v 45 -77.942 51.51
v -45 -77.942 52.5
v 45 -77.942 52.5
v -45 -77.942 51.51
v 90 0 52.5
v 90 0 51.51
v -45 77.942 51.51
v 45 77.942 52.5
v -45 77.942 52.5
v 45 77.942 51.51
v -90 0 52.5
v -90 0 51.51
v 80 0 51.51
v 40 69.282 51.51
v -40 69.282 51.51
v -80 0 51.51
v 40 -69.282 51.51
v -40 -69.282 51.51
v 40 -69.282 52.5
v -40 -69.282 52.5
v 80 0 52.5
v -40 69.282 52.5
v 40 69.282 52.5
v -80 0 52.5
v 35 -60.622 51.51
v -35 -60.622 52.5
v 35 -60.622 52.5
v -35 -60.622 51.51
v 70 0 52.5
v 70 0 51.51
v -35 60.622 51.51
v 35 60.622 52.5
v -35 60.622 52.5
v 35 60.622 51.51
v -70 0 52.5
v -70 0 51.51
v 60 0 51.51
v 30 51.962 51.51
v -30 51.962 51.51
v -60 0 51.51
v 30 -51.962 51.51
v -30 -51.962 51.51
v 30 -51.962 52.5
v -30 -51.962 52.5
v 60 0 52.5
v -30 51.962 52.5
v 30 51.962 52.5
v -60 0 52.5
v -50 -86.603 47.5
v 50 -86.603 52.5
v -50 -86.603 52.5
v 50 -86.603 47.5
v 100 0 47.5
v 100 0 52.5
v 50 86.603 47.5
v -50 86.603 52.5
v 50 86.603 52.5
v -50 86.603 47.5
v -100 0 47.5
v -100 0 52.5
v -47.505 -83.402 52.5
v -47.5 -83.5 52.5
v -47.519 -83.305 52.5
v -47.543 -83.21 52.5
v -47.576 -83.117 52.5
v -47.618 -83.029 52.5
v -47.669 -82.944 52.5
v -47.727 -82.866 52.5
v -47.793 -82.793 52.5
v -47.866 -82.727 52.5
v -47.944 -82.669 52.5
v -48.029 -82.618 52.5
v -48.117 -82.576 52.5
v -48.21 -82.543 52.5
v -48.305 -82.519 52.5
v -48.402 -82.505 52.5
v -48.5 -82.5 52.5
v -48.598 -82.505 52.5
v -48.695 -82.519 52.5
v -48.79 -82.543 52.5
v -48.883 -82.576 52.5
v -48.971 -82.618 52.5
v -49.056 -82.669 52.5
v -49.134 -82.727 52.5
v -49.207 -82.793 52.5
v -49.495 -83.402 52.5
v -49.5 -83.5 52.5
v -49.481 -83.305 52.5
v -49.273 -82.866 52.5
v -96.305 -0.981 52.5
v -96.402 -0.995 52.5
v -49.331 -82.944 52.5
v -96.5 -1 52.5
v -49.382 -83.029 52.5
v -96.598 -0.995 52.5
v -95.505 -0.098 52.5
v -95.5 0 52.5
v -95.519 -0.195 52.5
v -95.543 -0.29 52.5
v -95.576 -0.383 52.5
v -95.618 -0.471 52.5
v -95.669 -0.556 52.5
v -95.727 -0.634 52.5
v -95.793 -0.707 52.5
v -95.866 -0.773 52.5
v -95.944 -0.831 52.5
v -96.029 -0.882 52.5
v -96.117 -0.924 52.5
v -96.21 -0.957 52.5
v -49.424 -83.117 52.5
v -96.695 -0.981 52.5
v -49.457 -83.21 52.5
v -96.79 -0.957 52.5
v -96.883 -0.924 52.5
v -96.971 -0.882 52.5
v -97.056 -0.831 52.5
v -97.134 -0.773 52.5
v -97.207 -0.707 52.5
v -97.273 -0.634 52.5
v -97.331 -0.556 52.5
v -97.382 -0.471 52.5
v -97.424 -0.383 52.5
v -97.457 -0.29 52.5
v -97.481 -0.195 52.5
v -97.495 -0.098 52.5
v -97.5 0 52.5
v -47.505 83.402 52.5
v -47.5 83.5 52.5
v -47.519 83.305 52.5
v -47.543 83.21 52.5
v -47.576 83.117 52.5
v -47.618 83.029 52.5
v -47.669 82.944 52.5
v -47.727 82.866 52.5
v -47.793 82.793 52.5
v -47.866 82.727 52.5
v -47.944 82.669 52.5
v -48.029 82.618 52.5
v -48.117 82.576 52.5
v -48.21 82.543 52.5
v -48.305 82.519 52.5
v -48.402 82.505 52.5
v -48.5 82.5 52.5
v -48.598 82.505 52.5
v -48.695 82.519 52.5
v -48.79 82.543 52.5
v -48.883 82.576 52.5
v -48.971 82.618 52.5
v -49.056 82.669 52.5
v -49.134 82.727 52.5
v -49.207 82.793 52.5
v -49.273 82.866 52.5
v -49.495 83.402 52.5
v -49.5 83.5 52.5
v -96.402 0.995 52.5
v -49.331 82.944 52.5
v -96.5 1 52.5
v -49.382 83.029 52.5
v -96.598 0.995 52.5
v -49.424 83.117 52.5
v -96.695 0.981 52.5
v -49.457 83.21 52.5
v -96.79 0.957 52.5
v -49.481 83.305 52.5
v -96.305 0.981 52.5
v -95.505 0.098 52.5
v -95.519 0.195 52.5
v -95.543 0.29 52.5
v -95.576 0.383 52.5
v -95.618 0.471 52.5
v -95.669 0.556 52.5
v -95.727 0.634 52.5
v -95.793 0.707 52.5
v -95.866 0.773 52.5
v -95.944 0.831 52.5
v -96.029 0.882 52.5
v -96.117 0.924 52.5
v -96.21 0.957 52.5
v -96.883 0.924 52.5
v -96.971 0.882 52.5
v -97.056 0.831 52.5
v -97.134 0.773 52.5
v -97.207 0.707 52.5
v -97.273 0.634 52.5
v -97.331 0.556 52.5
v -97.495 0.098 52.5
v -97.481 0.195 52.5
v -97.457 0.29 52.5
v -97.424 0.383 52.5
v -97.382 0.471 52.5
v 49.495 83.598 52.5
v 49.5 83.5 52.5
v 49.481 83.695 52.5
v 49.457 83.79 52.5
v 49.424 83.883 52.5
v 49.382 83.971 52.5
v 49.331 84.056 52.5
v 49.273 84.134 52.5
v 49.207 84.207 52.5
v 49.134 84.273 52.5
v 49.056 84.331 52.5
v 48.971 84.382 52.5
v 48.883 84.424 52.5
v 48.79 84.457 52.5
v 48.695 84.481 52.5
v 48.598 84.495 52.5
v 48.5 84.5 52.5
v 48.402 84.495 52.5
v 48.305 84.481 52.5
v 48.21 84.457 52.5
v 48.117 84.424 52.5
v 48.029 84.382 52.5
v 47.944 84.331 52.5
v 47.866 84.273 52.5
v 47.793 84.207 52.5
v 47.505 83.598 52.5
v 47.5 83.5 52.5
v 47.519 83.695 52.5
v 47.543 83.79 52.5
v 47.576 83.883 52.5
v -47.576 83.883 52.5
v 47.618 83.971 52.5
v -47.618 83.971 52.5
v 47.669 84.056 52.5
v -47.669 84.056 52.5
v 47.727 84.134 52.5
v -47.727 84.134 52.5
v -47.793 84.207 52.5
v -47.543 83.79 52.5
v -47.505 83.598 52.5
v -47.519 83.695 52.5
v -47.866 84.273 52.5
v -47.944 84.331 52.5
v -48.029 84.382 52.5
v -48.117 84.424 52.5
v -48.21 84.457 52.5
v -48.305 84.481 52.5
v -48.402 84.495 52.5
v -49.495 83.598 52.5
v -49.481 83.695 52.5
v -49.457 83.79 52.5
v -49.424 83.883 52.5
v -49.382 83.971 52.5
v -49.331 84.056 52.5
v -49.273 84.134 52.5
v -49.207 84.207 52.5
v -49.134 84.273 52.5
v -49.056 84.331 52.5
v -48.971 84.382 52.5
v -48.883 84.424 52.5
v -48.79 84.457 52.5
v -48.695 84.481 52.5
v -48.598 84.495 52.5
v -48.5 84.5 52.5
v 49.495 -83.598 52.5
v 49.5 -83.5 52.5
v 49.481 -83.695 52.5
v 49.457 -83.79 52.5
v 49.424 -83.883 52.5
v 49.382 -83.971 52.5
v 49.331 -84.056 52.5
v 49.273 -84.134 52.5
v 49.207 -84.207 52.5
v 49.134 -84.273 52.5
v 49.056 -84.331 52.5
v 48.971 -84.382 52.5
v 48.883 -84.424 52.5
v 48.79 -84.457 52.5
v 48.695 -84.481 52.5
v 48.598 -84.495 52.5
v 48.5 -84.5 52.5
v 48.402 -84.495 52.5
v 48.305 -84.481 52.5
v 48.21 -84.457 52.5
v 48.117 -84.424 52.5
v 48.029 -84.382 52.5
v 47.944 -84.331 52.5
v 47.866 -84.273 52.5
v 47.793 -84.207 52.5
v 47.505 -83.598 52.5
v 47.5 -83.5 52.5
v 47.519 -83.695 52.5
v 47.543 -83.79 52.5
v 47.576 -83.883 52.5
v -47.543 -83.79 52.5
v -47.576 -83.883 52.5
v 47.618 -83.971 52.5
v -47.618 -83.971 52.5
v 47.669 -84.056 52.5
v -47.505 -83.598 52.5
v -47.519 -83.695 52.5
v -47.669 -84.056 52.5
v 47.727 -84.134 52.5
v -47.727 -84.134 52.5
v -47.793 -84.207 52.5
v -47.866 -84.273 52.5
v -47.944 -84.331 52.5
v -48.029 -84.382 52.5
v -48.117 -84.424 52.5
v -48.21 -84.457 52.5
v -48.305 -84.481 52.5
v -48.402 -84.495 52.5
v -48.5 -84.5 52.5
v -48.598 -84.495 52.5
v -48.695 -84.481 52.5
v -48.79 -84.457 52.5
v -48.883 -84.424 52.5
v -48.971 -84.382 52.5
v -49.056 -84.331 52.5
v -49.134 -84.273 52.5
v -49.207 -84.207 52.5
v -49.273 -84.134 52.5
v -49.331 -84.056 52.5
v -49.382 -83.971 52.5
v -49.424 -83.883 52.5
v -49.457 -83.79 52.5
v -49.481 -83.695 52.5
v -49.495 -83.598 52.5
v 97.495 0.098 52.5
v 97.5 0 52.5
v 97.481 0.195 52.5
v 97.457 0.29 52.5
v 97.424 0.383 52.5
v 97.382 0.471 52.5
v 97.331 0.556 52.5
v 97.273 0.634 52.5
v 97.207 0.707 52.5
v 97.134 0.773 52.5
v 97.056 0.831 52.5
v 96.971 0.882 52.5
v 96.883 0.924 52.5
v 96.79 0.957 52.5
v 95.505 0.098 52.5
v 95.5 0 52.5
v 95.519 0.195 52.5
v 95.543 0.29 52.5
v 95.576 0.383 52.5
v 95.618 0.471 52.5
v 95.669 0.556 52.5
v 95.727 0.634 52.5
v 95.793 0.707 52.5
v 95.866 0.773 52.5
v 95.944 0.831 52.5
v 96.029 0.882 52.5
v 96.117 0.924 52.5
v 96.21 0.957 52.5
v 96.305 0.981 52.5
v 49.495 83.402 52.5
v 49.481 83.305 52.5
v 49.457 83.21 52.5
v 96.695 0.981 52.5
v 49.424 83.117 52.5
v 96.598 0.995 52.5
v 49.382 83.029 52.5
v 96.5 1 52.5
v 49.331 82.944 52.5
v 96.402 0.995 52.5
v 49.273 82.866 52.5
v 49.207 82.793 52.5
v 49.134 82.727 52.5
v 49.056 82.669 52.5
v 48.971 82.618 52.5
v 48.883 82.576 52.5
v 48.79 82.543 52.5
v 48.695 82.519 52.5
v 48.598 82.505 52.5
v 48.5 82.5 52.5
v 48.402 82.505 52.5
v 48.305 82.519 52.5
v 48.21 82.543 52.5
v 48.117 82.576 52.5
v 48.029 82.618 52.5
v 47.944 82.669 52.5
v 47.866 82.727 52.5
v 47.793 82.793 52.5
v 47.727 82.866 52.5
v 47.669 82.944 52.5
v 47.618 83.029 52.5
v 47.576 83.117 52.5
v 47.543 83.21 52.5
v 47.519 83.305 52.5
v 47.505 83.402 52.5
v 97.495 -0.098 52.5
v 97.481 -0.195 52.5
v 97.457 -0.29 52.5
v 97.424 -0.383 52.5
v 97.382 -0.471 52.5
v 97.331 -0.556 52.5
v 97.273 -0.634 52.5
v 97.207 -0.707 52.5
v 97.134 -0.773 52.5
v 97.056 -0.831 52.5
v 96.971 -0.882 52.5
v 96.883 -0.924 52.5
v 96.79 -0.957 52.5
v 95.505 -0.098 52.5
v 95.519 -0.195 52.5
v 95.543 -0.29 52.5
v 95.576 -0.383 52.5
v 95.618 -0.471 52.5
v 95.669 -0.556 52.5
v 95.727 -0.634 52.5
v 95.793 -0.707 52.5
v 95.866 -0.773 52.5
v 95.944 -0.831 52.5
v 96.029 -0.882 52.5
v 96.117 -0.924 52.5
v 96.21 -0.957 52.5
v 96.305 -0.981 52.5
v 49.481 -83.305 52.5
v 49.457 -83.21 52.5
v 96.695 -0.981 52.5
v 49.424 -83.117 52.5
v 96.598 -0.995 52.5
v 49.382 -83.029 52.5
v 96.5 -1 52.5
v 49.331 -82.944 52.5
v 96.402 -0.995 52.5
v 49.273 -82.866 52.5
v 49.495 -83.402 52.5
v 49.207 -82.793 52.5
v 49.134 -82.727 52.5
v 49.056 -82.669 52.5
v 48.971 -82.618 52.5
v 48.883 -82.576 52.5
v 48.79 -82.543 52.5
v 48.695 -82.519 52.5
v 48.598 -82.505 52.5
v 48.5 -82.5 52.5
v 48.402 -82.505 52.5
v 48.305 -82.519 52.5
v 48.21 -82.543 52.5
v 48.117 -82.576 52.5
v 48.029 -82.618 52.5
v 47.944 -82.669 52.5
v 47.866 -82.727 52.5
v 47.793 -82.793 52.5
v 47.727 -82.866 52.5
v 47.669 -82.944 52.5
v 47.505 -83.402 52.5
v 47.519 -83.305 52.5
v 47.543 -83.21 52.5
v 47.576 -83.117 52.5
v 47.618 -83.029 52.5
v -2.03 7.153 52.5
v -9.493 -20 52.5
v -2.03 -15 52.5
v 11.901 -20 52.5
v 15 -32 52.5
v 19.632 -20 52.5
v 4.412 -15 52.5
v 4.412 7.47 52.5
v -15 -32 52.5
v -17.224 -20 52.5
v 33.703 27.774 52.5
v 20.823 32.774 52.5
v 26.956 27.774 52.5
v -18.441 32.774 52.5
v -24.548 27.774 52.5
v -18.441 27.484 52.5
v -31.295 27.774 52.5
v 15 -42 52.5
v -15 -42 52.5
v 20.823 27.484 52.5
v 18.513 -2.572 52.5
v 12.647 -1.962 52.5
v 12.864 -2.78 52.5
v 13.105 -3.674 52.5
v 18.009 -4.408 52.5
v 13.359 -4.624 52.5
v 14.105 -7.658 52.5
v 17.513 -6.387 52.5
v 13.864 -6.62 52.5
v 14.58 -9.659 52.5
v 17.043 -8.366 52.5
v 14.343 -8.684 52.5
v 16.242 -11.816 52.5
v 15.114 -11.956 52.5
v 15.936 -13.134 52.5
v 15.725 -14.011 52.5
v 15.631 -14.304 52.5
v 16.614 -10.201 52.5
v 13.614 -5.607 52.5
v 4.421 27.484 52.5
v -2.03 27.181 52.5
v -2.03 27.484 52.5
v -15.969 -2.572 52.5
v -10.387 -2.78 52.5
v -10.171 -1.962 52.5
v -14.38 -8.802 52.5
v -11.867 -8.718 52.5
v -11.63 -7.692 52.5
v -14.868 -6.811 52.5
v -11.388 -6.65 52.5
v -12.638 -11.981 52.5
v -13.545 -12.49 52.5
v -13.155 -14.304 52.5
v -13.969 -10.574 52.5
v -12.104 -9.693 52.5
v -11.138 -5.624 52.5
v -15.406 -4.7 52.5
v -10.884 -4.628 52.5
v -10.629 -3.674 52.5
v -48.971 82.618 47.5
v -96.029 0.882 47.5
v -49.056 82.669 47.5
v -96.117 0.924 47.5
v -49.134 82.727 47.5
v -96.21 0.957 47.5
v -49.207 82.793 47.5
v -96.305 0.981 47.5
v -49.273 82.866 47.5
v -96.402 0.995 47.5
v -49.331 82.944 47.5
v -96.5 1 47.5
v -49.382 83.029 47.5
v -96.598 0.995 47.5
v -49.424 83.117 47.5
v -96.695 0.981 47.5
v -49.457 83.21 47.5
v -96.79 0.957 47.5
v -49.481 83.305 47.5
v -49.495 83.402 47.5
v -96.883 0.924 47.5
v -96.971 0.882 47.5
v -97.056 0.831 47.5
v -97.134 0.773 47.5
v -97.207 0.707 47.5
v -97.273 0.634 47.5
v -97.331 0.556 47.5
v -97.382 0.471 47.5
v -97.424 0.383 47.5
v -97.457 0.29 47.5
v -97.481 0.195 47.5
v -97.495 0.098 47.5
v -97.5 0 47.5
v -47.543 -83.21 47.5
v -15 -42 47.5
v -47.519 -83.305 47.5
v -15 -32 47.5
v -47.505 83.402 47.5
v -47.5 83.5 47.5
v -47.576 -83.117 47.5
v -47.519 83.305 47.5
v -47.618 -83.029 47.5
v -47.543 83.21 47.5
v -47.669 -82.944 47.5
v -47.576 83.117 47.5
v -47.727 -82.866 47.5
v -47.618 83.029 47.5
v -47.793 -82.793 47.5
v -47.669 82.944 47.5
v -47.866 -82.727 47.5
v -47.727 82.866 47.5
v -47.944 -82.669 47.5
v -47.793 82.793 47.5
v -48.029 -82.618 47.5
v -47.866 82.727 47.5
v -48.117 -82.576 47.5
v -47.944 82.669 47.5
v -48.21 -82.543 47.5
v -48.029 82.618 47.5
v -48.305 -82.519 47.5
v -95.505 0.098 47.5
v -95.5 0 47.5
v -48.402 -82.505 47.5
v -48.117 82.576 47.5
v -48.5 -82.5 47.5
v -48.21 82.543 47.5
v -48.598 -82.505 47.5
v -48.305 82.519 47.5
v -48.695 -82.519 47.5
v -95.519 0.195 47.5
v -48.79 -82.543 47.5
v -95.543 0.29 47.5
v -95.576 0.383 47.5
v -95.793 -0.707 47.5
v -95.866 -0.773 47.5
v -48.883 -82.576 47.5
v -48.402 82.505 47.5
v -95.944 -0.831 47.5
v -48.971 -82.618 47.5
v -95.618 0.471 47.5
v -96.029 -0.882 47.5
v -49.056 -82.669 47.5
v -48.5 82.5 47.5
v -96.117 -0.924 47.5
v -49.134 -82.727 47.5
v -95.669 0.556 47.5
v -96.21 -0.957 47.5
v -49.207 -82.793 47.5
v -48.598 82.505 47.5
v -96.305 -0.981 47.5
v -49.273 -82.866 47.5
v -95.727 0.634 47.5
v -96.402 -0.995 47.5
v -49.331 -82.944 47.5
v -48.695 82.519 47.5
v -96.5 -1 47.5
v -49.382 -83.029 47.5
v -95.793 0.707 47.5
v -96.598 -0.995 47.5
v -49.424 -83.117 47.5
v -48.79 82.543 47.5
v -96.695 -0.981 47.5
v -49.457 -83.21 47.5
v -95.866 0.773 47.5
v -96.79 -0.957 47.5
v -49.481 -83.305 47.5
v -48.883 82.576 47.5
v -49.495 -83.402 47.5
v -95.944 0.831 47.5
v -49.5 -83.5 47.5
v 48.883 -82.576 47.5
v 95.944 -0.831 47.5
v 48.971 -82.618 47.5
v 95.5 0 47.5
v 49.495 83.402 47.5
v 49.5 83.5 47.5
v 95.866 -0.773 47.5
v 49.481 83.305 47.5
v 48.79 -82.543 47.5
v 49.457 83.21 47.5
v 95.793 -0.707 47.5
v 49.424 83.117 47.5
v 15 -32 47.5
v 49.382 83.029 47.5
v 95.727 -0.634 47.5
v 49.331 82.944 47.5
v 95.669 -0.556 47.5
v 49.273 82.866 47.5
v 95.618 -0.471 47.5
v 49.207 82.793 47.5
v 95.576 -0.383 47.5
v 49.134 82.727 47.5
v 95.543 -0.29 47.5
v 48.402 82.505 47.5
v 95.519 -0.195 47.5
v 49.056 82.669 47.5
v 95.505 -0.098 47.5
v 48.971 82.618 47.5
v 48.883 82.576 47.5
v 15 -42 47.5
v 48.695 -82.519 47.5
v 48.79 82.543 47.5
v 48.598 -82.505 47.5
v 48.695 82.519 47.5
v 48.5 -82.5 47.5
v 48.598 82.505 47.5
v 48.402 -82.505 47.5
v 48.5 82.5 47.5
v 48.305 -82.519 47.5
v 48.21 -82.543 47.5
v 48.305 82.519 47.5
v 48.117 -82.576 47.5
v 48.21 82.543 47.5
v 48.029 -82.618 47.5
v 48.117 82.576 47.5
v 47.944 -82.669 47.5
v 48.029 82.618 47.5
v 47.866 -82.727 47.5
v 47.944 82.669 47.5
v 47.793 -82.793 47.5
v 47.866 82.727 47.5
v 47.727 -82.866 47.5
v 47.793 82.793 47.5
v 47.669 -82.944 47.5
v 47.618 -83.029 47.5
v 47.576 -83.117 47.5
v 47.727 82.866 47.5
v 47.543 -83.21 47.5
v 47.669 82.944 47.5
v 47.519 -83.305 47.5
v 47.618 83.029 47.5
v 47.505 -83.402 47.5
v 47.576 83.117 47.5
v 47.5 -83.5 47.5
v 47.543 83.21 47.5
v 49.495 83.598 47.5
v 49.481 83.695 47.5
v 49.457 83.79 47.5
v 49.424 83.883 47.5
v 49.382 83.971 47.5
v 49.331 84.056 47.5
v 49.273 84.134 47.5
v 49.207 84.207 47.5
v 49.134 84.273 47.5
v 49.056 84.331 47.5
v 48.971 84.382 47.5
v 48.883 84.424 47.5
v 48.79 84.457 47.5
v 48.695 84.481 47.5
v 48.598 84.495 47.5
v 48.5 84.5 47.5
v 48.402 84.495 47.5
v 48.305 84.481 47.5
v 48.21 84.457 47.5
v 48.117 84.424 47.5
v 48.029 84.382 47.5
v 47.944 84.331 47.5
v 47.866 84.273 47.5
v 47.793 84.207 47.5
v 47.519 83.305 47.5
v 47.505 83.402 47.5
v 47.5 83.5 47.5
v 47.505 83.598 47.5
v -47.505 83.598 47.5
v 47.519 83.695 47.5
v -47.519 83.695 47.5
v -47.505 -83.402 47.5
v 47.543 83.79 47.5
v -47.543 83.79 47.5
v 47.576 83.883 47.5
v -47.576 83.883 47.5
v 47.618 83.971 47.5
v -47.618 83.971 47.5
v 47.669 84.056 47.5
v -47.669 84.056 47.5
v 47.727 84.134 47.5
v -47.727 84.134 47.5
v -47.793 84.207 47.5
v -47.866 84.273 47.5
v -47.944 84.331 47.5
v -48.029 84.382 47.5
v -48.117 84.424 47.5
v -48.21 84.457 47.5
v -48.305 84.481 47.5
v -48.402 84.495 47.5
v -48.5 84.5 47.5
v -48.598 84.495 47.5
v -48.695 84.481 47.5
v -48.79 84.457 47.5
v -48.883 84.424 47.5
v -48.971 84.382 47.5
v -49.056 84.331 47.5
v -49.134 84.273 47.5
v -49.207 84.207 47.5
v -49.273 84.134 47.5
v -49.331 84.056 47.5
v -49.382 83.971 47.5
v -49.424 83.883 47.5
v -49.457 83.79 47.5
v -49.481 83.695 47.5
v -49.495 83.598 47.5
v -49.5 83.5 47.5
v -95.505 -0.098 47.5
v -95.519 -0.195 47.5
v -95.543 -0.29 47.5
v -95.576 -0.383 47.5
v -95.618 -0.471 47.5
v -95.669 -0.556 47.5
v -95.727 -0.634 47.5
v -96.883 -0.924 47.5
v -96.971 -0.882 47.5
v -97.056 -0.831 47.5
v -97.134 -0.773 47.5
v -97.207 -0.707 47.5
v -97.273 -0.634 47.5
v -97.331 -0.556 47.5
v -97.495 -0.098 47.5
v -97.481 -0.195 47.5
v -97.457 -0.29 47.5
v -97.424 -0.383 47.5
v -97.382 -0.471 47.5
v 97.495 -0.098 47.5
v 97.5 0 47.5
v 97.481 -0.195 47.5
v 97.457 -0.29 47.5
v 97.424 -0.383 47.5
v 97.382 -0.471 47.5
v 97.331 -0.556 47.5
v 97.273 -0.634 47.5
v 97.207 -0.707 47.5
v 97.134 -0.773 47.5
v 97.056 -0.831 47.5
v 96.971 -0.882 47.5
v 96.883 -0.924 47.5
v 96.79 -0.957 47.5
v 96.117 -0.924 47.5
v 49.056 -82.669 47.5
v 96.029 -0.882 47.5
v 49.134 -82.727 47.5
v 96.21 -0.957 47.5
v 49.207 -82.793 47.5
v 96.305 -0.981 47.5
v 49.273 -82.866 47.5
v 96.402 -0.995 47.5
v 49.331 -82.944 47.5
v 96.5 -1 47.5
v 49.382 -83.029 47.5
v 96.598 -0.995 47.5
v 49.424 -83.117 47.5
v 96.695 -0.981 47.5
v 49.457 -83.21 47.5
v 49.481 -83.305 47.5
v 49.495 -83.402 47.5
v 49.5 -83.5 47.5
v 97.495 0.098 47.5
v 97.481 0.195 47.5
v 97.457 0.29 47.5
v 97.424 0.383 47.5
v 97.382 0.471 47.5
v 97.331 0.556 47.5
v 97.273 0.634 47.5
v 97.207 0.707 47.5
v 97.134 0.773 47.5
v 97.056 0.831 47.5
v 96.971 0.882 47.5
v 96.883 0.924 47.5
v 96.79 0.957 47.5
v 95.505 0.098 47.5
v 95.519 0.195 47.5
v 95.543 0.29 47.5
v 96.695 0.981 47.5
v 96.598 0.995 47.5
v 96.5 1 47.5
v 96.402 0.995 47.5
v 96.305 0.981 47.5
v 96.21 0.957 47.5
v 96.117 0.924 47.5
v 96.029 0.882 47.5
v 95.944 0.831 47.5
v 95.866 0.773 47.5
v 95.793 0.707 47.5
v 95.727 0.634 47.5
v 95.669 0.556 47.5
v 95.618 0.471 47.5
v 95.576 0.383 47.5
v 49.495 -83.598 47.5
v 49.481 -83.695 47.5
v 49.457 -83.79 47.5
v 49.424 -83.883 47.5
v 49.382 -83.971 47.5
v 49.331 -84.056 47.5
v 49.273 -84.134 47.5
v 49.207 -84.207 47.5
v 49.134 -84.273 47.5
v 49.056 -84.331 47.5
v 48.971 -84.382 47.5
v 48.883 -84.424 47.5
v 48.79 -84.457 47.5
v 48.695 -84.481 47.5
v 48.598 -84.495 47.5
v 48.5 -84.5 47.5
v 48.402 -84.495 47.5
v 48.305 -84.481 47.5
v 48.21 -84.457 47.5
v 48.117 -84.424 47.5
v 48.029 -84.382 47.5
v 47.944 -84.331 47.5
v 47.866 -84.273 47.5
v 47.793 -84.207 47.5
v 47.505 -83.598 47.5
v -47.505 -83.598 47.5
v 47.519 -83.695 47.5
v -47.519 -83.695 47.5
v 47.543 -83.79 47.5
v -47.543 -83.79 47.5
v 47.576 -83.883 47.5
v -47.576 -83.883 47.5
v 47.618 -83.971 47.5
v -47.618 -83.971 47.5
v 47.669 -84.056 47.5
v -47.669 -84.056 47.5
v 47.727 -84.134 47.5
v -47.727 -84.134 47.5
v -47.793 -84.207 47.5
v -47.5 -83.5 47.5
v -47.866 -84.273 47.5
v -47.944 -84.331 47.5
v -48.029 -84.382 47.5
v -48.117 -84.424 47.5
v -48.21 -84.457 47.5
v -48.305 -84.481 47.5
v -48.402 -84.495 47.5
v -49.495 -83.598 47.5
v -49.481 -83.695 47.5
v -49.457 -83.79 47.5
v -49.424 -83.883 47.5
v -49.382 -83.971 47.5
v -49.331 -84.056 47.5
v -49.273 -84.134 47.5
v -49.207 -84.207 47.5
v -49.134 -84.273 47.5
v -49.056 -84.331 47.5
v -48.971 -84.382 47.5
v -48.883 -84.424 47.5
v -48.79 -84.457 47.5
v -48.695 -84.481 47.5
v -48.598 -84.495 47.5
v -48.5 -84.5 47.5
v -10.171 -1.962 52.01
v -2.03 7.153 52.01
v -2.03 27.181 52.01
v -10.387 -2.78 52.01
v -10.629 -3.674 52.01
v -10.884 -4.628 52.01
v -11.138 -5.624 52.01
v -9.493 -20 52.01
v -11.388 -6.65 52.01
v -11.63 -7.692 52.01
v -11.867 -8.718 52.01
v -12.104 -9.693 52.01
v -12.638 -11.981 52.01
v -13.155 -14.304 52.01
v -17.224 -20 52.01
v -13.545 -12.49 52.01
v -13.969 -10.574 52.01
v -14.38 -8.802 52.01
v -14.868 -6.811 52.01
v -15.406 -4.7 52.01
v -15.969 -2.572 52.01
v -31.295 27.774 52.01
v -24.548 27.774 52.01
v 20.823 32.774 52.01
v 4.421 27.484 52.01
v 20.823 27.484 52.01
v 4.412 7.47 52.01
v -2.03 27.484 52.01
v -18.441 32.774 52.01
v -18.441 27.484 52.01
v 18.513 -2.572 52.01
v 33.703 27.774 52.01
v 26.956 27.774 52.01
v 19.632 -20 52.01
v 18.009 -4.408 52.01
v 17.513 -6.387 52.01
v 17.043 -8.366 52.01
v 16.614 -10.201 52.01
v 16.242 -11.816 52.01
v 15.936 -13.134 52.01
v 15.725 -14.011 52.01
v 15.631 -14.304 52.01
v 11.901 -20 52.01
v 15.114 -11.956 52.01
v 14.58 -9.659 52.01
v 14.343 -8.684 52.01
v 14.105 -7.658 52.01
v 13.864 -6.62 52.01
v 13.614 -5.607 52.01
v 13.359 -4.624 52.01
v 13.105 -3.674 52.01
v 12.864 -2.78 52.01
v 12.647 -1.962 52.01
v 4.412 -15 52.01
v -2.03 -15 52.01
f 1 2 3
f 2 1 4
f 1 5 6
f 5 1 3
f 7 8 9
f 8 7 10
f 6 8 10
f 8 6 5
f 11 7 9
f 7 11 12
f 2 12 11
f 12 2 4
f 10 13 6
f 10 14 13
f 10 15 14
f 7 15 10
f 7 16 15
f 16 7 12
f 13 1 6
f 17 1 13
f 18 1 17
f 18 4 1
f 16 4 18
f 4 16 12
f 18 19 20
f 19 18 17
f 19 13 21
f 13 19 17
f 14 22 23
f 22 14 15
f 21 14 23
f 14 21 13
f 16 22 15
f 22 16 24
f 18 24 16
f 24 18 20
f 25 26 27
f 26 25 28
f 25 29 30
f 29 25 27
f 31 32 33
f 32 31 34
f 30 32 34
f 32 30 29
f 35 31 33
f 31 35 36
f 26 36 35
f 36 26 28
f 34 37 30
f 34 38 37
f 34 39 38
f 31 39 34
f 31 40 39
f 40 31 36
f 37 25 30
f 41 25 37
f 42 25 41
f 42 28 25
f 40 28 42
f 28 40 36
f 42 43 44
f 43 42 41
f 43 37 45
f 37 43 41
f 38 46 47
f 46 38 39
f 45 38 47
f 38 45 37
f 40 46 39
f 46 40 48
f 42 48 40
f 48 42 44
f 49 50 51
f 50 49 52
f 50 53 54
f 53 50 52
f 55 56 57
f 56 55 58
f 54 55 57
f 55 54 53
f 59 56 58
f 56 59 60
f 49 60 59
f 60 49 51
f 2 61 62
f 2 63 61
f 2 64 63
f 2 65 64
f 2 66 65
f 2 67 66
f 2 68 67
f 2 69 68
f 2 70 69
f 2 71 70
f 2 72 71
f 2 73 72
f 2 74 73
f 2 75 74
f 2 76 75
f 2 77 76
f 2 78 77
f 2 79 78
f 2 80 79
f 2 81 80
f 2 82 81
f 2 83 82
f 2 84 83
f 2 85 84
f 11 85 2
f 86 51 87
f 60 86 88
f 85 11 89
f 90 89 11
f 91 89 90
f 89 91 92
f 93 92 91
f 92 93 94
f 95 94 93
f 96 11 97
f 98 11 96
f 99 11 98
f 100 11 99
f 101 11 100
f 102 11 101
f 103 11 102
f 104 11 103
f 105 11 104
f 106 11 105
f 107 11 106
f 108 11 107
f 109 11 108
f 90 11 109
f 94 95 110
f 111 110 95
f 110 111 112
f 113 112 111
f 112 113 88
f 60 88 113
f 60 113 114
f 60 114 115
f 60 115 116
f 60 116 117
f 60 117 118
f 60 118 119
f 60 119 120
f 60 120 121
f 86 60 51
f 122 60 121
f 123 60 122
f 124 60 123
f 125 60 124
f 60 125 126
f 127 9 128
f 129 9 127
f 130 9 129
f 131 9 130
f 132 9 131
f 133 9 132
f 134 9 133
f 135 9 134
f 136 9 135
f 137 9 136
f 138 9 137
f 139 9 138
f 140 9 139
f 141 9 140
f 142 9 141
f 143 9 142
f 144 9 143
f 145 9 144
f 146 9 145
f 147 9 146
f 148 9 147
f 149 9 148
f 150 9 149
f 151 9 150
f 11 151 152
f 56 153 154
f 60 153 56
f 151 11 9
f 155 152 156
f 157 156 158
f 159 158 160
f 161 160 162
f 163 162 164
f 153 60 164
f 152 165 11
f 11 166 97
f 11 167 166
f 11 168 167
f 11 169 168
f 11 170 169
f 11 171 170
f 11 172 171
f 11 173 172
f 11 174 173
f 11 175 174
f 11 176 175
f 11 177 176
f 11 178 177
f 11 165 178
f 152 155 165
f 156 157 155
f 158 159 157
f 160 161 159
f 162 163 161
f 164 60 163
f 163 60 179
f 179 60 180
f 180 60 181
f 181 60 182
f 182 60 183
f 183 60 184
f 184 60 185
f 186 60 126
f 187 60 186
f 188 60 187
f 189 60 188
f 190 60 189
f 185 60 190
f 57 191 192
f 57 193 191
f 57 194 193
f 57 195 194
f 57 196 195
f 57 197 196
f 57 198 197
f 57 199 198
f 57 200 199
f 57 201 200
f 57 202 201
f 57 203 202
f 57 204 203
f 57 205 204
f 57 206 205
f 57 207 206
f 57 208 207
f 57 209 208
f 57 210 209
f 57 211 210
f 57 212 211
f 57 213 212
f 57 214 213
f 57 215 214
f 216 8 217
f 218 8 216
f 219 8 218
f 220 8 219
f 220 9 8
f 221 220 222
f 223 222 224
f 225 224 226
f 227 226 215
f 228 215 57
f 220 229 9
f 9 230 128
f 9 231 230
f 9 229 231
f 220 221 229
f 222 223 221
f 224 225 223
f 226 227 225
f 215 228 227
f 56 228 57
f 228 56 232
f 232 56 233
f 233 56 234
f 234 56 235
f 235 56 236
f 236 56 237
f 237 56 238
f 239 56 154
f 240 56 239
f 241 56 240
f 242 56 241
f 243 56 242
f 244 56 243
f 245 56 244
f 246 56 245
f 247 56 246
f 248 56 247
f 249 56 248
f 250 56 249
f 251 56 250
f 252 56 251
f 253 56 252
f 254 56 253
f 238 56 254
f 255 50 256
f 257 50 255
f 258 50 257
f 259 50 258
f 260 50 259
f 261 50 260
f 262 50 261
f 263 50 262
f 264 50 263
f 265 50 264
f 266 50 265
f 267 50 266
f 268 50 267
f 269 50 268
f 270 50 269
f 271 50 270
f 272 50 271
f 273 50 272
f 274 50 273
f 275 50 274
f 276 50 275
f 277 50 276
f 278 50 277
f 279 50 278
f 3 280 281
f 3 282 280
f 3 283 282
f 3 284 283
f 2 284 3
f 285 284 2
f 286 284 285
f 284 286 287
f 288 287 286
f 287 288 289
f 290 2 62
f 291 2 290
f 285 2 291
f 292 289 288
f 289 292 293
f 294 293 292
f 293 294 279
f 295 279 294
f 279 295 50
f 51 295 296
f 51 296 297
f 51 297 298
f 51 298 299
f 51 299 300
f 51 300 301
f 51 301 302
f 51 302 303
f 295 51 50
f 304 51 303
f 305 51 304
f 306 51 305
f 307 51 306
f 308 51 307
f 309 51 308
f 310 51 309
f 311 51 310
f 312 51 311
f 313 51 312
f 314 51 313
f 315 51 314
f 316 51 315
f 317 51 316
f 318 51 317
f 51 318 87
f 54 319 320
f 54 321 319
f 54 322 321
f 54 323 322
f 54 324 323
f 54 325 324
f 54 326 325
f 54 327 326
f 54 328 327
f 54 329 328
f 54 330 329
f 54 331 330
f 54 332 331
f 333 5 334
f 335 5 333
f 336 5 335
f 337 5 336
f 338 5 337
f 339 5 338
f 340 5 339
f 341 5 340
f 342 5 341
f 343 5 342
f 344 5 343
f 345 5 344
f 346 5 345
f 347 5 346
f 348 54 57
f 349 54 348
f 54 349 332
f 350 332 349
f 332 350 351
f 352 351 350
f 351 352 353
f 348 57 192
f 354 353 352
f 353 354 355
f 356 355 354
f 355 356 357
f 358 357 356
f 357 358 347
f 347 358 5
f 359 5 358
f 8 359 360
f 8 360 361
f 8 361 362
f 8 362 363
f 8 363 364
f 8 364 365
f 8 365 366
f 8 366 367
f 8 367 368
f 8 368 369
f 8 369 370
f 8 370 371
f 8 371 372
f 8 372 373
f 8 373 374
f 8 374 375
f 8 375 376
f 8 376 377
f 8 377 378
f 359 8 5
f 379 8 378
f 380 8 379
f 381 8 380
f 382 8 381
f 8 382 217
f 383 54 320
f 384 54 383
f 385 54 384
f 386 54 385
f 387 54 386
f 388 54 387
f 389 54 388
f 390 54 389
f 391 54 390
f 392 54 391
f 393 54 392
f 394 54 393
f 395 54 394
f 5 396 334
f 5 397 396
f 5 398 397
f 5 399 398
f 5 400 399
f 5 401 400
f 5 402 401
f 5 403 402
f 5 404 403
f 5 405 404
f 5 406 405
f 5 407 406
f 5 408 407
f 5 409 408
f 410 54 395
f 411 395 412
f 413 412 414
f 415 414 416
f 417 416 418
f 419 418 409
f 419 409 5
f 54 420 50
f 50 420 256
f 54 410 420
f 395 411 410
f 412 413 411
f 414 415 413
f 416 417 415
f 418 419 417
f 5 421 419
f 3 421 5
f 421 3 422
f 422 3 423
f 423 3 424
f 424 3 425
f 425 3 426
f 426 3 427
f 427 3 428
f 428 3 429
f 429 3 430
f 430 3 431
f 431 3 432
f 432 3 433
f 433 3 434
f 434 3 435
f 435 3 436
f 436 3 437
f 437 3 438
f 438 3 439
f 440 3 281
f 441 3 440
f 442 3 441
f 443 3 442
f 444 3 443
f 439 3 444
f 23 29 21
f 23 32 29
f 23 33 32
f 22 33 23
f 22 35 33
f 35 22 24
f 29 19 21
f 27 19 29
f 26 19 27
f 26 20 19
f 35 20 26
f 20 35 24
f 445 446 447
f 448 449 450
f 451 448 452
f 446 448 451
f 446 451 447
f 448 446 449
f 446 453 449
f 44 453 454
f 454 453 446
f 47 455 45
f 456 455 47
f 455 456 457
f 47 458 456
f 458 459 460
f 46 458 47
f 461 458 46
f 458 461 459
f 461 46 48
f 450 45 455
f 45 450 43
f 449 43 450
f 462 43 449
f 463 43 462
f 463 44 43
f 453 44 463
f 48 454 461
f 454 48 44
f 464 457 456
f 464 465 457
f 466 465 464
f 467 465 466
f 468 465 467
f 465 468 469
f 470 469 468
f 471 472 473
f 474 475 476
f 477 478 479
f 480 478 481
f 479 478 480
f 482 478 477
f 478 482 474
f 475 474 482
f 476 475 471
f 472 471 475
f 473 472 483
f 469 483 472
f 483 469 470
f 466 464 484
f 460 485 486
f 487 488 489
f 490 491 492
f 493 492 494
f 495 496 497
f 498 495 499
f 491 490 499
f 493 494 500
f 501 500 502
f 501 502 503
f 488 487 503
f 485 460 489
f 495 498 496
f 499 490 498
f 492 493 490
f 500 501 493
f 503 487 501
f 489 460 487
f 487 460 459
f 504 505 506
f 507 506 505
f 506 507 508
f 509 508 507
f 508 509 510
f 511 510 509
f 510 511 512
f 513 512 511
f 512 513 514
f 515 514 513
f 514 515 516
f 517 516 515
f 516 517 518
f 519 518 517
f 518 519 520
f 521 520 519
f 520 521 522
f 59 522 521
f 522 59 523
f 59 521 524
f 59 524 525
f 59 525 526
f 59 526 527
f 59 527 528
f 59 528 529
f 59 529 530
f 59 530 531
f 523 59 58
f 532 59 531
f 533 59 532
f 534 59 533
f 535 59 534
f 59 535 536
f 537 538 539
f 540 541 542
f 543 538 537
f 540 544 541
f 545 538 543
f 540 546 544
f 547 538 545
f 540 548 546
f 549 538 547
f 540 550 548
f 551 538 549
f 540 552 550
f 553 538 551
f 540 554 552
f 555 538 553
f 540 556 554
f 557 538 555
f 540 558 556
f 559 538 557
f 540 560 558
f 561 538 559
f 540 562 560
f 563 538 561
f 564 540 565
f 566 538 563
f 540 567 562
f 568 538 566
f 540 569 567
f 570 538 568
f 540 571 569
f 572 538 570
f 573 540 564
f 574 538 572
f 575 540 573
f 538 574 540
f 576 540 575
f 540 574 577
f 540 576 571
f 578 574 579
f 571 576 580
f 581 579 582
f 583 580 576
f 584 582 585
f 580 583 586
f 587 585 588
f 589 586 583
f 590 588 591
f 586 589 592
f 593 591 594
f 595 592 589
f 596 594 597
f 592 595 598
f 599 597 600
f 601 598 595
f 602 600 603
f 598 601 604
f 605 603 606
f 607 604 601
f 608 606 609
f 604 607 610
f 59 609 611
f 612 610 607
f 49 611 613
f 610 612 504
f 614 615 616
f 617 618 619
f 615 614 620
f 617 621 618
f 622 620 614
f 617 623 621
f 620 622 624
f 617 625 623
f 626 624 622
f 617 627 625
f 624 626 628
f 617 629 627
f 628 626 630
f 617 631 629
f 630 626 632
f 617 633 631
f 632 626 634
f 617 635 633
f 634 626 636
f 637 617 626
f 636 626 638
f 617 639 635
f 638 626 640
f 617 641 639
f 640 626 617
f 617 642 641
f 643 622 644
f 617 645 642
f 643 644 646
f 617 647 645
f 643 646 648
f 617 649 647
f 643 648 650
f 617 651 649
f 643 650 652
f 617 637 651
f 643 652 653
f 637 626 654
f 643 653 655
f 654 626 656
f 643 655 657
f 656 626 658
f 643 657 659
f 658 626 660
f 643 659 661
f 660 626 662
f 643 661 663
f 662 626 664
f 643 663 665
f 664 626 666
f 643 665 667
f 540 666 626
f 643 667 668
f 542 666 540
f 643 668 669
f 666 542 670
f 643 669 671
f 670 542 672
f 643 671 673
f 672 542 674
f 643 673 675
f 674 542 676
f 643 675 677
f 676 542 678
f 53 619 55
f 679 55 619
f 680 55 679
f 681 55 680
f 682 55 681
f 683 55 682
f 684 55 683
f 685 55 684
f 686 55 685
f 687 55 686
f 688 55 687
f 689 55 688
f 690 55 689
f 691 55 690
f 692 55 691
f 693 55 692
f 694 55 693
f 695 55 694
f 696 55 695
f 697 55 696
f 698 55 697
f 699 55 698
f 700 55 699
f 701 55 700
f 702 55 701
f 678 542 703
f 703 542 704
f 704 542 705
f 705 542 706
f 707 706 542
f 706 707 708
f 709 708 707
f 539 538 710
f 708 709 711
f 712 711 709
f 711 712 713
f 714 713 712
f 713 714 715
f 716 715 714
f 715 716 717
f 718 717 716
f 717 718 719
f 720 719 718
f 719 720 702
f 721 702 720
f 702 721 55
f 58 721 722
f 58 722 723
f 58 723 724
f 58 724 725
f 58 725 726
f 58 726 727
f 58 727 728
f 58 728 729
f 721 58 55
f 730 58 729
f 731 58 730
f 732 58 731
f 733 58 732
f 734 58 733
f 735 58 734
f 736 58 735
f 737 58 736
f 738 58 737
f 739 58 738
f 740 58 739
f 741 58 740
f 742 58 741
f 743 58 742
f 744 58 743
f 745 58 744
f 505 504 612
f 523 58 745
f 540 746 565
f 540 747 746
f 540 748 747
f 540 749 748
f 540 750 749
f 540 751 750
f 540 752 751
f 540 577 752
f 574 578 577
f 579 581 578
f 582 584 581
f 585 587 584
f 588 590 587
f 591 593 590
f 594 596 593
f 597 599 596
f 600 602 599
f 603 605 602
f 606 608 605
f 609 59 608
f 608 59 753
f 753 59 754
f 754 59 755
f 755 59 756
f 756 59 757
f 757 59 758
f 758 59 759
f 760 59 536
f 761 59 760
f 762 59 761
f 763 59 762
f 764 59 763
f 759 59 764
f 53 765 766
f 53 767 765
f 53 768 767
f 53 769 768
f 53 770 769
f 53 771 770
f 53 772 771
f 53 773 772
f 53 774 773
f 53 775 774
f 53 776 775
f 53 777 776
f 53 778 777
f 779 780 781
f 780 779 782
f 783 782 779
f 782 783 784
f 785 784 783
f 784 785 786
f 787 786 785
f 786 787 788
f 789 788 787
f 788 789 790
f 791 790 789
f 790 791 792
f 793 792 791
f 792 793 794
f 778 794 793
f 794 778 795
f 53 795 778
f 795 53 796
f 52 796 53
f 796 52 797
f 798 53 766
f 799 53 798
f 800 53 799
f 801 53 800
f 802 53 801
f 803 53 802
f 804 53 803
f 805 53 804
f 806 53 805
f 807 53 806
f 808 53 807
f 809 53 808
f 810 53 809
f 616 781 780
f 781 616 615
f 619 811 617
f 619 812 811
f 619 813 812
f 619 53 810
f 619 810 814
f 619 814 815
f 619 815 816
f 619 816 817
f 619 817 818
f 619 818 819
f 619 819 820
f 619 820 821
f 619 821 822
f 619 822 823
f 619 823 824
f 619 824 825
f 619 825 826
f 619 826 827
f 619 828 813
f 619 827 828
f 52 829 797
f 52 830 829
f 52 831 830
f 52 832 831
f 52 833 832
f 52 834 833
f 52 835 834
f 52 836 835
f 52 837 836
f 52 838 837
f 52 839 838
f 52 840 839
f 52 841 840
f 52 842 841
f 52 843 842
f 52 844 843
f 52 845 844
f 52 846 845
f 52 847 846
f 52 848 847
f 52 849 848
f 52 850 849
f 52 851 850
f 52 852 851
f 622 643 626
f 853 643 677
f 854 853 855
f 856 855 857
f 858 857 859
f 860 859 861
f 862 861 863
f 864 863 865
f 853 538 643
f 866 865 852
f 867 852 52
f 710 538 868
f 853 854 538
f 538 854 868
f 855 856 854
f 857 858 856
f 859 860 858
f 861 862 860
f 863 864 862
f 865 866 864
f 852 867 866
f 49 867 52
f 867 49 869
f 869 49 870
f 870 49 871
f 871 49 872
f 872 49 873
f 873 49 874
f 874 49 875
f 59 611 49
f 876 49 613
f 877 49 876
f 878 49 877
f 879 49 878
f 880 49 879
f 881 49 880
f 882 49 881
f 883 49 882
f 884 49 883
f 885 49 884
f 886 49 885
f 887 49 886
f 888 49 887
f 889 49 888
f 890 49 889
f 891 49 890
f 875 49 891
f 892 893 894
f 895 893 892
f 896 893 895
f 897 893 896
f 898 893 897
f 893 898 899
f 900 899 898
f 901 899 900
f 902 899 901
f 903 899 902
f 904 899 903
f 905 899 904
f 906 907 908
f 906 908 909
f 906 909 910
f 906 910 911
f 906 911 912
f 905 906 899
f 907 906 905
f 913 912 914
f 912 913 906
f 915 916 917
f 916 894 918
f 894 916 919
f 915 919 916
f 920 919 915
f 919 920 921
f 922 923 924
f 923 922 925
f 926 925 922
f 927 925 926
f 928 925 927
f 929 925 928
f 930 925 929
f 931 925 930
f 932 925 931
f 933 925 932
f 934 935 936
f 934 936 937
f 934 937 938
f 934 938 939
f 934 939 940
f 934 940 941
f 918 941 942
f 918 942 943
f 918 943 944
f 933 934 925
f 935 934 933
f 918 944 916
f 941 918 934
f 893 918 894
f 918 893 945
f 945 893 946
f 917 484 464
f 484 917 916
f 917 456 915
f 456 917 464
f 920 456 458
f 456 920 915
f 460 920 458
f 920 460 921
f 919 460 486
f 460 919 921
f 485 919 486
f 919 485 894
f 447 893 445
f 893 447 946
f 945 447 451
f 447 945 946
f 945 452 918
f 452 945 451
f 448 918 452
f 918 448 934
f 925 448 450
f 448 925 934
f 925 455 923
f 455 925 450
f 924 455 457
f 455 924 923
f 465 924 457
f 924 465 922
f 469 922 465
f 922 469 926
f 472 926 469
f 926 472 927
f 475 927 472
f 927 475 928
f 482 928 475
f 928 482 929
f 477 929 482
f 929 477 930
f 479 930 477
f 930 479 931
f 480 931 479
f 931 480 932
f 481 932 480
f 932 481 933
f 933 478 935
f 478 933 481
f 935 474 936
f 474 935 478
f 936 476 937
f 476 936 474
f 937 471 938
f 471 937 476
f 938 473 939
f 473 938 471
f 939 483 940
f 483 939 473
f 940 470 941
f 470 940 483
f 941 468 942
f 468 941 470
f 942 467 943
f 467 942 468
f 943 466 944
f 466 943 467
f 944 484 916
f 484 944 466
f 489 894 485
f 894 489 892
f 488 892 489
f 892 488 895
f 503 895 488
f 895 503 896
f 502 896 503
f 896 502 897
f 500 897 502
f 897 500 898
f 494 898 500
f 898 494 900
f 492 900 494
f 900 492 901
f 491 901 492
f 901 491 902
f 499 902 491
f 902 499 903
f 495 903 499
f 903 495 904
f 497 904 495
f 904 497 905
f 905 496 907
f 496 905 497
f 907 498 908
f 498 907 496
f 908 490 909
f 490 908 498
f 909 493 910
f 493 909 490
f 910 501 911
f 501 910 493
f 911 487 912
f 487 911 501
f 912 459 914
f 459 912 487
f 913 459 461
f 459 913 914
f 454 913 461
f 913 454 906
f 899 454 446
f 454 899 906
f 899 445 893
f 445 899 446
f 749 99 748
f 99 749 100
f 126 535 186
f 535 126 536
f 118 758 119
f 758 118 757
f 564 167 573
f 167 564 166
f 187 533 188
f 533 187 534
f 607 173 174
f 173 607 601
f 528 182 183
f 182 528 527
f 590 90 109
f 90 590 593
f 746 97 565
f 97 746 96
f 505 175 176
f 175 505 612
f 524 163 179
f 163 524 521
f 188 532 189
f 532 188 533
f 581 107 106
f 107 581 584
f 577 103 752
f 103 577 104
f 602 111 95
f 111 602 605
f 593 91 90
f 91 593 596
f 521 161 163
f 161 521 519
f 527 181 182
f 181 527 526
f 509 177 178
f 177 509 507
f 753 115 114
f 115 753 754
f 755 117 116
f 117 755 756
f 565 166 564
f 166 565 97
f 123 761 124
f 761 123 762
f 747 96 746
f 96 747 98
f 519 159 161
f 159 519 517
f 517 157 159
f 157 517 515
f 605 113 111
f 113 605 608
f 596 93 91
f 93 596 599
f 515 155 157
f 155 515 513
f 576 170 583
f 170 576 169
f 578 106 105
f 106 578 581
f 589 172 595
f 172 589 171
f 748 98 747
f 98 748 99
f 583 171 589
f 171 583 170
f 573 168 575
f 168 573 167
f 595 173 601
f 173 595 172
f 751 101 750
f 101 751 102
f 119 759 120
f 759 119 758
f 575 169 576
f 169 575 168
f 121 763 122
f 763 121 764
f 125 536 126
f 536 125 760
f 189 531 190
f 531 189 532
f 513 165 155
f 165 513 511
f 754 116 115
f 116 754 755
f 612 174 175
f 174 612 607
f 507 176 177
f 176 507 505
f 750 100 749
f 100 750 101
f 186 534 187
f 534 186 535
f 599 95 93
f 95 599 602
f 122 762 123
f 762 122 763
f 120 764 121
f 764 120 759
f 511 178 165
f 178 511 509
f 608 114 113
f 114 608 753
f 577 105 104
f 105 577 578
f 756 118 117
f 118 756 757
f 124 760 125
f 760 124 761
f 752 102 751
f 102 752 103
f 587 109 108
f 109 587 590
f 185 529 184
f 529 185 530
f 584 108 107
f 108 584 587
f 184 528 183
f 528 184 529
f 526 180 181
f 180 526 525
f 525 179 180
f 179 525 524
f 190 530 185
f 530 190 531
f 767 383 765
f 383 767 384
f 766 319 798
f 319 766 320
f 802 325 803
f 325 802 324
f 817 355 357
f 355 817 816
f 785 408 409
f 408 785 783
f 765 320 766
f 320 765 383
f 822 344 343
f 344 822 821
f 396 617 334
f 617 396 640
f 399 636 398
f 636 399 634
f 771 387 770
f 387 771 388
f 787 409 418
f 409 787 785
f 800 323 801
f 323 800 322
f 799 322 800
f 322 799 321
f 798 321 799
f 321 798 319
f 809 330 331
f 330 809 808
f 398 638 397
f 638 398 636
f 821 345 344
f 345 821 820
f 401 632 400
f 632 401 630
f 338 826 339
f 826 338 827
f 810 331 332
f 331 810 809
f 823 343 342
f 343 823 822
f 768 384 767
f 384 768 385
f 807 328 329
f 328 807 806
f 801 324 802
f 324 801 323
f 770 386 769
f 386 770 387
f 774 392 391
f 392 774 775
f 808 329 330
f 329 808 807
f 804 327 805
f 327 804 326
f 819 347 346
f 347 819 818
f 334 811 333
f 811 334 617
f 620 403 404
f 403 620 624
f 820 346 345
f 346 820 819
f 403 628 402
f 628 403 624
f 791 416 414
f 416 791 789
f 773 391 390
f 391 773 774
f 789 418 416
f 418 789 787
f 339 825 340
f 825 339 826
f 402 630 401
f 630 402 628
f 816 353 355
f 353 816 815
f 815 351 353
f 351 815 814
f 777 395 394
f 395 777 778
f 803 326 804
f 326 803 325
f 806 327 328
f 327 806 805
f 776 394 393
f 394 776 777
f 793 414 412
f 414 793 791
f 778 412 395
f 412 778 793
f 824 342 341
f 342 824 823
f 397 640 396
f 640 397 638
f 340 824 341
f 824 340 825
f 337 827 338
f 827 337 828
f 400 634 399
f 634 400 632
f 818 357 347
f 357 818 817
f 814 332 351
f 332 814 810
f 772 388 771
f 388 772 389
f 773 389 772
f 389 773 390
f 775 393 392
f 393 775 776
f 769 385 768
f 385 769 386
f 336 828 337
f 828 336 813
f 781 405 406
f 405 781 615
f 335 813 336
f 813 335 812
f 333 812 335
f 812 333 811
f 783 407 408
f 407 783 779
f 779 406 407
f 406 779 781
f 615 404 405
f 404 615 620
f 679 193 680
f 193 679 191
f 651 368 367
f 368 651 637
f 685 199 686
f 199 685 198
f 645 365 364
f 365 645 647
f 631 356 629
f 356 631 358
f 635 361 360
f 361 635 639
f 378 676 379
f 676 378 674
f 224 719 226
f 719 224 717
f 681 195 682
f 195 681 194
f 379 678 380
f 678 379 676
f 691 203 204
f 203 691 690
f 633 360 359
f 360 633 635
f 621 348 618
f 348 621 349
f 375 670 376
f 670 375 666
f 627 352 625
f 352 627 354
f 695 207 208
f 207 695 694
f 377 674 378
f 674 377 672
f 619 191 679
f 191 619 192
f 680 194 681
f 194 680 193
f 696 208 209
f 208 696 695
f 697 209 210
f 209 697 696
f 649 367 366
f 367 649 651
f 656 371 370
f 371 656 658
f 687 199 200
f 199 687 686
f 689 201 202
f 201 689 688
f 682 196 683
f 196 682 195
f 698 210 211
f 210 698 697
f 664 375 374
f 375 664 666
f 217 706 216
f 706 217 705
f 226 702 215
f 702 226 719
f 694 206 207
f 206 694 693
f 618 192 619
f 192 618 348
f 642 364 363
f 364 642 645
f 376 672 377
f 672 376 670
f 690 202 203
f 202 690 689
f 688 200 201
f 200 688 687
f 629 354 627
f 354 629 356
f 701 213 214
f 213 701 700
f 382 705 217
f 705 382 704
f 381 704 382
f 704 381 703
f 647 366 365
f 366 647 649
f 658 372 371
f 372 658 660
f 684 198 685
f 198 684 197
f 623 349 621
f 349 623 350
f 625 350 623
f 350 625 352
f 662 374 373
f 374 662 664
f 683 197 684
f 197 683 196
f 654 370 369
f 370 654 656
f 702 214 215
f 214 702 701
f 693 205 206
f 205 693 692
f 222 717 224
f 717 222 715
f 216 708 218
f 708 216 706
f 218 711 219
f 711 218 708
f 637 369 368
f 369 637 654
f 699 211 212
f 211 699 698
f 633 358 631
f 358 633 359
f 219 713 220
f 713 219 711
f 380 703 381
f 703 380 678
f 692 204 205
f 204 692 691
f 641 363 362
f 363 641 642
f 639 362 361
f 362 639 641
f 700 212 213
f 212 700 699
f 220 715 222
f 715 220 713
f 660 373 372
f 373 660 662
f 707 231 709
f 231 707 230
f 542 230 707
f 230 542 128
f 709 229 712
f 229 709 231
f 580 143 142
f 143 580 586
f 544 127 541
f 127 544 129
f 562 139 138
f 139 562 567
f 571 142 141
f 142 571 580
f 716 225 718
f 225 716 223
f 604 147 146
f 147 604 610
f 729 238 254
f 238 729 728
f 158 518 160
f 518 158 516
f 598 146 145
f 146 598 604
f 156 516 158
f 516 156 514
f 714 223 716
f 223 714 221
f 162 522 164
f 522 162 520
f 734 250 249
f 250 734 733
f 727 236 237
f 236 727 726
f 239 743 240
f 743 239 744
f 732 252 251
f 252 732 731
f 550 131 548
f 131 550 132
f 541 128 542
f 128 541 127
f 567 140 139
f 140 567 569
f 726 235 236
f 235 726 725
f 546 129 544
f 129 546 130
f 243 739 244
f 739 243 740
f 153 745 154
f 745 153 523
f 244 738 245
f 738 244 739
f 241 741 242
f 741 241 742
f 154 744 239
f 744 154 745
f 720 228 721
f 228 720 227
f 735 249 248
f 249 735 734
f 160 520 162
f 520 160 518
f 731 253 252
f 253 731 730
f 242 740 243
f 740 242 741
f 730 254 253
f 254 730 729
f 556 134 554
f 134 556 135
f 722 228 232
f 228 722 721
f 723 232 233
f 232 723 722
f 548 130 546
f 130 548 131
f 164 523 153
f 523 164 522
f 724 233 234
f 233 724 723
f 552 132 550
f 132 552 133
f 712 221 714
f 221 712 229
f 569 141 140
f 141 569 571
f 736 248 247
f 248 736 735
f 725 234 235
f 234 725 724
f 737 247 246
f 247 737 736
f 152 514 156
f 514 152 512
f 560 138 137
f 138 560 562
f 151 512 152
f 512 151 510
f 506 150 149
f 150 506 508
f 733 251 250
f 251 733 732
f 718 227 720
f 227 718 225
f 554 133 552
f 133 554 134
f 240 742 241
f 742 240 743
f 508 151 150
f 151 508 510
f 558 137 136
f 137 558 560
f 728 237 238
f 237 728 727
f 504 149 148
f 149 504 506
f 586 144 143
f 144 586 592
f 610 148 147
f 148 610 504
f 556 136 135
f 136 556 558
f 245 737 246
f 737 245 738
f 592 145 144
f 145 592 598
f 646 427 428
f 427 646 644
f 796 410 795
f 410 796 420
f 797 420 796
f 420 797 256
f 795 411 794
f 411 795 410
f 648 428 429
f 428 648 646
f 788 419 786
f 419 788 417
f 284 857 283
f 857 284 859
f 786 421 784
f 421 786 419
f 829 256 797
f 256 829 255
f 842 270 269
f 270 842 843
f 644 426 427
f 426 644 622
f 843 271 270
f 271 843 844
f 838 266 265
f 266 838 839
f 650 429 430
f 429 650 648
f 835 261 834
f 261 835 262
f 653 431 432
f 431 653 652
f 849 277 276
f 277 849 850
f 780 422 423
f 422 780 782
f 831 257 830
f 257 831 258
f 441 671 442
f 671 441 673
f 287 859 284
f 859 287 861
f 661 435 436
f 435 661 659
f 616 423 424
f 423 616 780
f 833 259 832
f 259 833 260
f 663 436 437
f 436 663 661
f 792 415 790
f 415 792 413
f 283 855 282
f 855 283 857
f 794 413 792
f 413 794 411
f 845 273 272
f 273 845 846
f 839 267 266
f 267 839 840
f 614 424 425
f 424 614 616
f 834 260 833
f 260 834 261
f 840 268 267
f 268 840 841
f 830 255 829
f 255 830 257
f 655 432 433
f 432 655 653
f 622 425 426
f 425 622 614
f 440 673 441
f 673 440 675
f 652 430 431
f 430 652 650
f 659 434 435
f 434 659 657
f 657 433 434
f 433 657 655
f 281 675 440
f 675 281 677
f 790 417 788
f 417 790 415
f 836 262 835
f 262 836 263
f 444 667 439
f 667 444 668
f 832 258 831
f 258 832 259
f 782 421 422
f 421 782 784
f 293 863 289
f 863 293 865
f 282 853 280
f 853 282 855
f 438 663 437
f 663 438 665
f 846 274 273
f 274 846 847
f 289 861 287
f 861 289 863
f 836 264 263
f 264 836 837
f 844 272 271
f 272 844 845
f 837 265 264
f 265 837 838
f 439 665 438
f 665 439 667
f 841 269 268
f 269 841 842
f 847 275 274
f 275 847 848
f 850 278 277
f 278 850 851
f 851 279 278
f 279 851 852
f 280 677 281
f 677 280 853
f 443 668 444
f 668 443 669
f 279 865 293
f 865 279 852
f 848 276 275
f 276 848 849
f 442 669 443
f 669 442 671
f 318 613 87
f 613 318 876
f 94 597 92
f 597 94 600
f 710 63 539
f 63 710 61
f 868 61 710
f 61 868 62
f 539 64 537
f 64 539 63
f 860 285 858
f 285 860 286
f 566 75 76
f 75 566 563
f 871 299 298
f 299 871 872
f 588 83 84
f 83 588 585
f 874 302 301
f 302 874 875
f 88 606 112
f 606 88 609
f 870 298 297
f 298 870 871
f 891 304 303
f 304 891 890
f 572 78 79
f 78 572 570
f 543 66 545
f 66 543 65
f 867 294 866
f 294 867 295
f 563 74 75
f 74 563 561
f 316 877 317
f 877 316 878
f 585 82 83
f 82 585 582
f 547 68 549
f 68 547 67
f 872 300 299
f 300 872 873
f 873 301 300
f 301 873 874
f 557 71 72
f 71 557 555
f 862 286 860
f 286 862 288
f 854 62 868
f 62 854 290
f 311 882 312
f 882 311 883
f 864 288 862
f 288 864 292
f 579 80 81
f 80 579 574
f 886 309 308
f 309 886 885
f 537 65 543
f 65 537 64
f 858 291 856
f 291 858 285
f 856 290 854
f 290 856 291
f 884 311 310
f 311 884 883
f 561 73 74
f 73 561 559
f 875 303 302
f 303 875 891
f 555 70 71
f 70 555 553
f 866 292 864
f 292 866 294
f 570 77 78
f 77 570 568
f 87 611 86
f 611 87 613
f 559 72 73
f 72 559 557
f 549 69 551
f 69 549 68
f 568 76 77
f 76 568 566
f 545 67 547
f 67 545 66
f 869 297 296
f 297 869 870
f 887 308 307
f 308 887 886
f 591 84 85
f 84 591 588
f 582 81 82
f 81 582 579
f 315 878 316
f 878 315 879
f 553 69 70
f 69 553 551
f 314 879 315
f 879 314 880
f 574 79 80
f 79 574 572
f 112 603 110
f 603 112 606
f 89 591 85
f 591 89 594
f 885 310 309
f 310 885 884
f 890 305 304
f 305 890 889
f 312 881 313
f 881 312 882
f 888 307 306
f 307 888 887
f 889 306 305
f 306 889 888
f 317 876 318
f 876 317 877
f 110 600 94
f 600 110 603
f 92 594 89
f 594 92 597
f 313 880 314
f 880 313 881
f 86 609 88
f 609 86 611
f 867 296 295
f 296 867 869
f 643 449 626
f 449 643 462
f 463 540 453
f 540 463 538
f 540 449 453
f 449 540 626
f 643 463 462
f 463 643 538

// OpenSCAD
$fn = 6;

thick = 6;
dia = 100;
screen_thick=0.6;
height = 50;

dheight=28;
dlength=28;

dheight_o = 35;
dlength_o = 60;

module base(){
    difference(){
        union(){
            difference(){
                cylinder(r=dia, h=height, center=true);
                
                translate([0,0,screen_thick])
                cylinder(r=dia-thick, h=height, center=true);
                
                translate([0,0,height/2-7.5+0.01])
                cylinder(r=dia-thick+.5, h=15, center=true);
                
                translate([0,0,height/2-11])
                cylinder(r=dia-thick+.8, h=11, center=true);
                
            }

            // margin for control-board
            translate([0,0,screen_thick])
            difference(){
                cylinder(r=dlength_o-10, h=height, center=true);
                translate([0,0,3])
                cylinder(r=dlength_o-10-thick/2, h=height, center=true);
            }
        }

        // hole for screen
        translate([0,0,-height/2])
        cube([dheight, dlength,10],center=true);
        
        // hole for screen-board
        translate([3,0,-height/2+3])
        cube([49.5,34.5,3], center=true);
        
        // holes to attach lid
        translate([-96.5,0,10], $fn=64)
        #cylinder(r=1, h=20);
        
        translate([96.5,0,10], $fn=64)
        #cylinder(r=1, h=20);
        
        translate([48.5,83.5,10], $fn=64)
        #cylinder(r=1, h=20);
        
        translate([-48.5,83.5,10], $fn=64)
        #cylinder(r=1, h=20);
        
        translate([48.5,-83.5,10], $fn=64)
        #cylinder(r=1, h=20);
        
        translate([-48.5,-83.5,10], $fn=64)
        #cylinder(r=1, h=20);
    }


    // 26 * 48.5 - node amica holder
    translate([0,-38.5,-height/2 + 49/2 + screen_thick])
    difference(){
        cube([27+6, 5, 49], center=true);
        cube([27, 5.01, 49.01], center=true);
    }

    translate([0,-38+5, -height/2 + 30/2+screen_thick])
    cube([15, 5, 30], center=true);

    //translate([dheight/2 + 3+2.5,dlength/2+13+2.5,-height/2+5])
    //cube([5,5,5], center=true);

    // 13mm eine seite, 7mm andere seite
    // 3mm oben und unten
    //cube([dlength_o, dheight_o, 5], center=true);
}


// deckel
translate([0,0,50]){
difference(){
    cylinder(r=dia, h=5, center=true);
    
    // Verzierung
    translate([0,0,2.01])
    difference(){
        cylinder(r=dia-10, h=1, center=true);
        cylinder(r=dia-20, h=1, center=true);
    }
    
    translate([0,0,2.01])
    difference(){
        cylinder(r=dia-30, h=1, center=true);
        cylinder(r=dia-40, h=1, center=true);
    }
    
    translate([-20,-15,2.01])
    linear_extrude(1)
    scale([5,5,5])
    text("T");
    
    translate([-31.6,-20,2.01])
    linear_extrude(1)
    scale([5,5,5])
    text("W");
    
    /*
    translate([0,30,2.01])
    cube([50,10,1], center=true);
    
    translate([0,1,2.01])
    cube([10,50,1], center=true);
    */
    
    
    // holes to attach lid
    translate([-96.5,0,-10], $fn=64)
    cylinder(r=1, h=20);
    
    translate([96.5,0,-10], $fn=64)
    cylinder(r=1, h=20);
    
    translate([48.5,83.5,-10], $fn=64)
    cylinder(r=1, h=20);
    
    translate([-48.5,83.5,-10], $fn=64)
    cylinder(r=1, h=20);
    
    translate([48.5,-83.5,-10], $fn=64)
    cylinder(r=1, h=20);
    
    translate([-48.5,-83.5,-10], $fn=64)
    cylinder(r=1, h=20);
    
    translate([0,-37,0])
    cube([30,10,10], center=true);
}


}
